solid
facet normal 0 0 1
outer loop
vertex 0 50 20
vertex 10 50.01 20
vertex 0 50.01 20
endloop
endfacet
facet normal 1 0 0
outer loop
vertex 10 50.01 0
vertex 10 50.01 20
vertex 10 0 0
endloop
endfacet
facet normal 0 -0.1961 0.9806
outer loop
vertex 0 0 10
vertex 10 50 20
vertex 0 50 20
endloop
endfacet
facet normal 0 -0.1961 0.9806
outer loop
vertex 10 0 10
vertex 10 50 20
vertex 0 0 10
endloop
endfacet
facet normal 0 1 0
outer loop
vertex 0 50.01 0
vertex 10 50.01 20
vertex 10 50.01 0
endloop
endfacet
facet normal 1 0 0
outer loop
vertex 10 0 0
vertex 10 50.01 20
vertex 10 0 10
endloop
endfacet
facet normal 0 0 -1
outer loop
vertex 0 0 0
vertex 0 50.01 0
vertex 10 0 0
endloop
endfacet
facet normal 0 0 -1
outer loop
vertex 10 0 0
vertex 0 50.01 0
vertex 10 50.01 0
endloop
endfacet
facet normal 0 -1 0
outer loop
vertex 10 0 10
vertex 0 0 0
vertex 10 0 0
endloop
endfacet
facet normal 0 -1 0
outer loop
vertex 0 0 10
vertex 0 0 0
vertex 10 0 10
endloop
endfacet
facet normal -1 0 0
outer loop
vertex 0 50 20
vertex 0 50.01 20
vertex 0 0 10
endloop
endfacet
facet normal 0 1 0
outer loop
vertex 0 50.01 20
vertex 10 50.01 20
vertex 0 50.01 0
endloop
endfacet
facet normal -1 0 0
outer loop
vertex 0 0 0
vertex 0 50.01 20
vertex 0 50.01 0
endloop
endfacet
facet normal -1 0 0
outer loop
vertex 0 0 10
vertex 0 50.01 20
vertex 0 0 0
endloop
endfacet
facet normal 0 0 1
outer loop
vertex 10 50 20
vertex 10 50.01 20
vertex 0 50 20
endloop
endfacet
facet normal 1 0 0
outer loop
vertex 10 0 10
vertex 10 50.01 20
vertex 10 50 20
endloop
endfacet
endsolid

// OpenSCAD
// file: beams.scad
/* 
 * openscad beams library
 * create complex openscads objects from frames which are defining beams
 * (constructed like a ship body or airplane hull)
 *
 * https://github.com/Stemer114/openscad_beams
 * http://www.thingiverse.com/Stemer114/designs
 * 
 *    Copyright (C) 2016 Stemer114 (stemer114@merunka.de)
 *
 *    This program is free software: you can redistribute it and/or modify
 *    it under the terms of the GNU General Public License as published by
 *    the Free Software Foundation, either version 3 of the License, or
 *    (at your option) any later version.
 *
 *    This program is distributed in the hope that it will be useful,
 *    but WITHOUT ANY WARRANTY; without even the implied warranty of
 *    MERCHANTABILITY or FITNESS FOR A PARTICULAR PURPOSE.  See the
 *    GNU General Public License for more details.
 *
 *    You should have received a copy of the GNU General Public License
 *    along with this program.  If not, see <http://www.gnu.org/licenses/>.
 *

 * Credits: 
 *          for some of the examples
 *          MCAD Library - Polyholes Copyright 2011 Nophead (of RepRap fame)
 *          It is licensed under the terms of Creative Commons Attribution 3.0 Unported.
 *          https://github.com/SolidCode/MCAD/blob/master/polyholes.scad
 *
 *          BeamsVersion, libEcho and code structure inspired by 
 *          OpenSCAD Parts Library by randyy is licensed under the GNU - LGPL license. 
 *          http://www.thingiverse.com/thing:6021
 *
 */

//**** house keeping
//we define these as functions to avoid assignment problems from caller modules
function BeamsVersion() = 1.0;  //library version
function ep()=0.01;  //epsilon environment to avoid non-manifold objects


//**** module definitions

// a single rectangular frame, usually very thin
// params: w - width of frame (x direction)
//         h - height of frame (z direction)
//         d - thickness of frame (y direction, usually very thin, e.g. 0.1mm)
//         o - offset vector from origin (probably best to use x and y offsets only here for starters)
//         r - rotation vector (probably best to use only z rotation here for starters)
//         vec - vector interface, used instead of the named params
//         the vector must use the following structure (example)
//           w  h  rotation    offset        thickness
//          [3, 4, [0, 0, 90], [0, -1.5, 0], ep ],   //start (front center)
//         there is no checking other than length checking to branch in the interface
//         so better make sure the vector conforms
//         the vector interface allows you to define a list of vectors in your source file
//         and supply them all at once to the beam module (see below)
//         this probably makes more sense if you look at some of the example files
module frame(
        w = 10,  //width
        h = 10,  //height
        r = [0, 0, 0],  //rotation vector
        o = [0, 0, 0],   //offset vector
        d = ep(),  //thickness (normally very thin)
        vec = [],  //vector, default none
        )
{
    if ( len(vec)==5 ) {
        //use vector interface
        translate( vec[3] )
            rotate( vec[2] )
            cube([ vec[0], vec[4], vec[1] ]);
    } else {
        //use single param interface
        translate(o)
            rotate(r)
            cube([w, d, h]);
    }  //end else
}  //end module

// a single beam consisting of two frames at either end, connected by a hull
// to disable hull, use no_hull=true (for debugging)
// beam uses the vector interface (see above in module frame)
module beam(
        frame1 = [10, 10, [0, 0, 0], [0, 0, 0], ep() ],
        frame2 = [10, 10, [0, 0, 0], [0, 20, 0], ep() ],
        no_hull = false,   
        )
{
    if ( no_hull ) {
        frame(vec=frame1);
        frame(vec=frame2);
    } else {
        hull() {
            frame(vec=frame1);
            frame(vec=frame2);
        }  //end hull
    }  //end else
}  //end module

// a beam consisting of 2 or more frames connected by hulls
// uses the vector interface (see above)
// see example scad files in library source to get an idea how to use this
module beam_multi(frames=[], no_hull=false )
{
    if ( len(frames)<2 ) {
        echo("WARNING: beam_multi: number of frames too small (must be at least 2): ", len(frames) );
    } else {
        for ( frame = [0:len(frames)-2] ) {
            beam( frames[frame], frames[frame+1], no_hull=no_hull );
        } //end for

    }
}

/*************************************************
 * interface 
*/

libEcho=true;
if (libEcho!=false){ 
	echo("****************************************************************  ");
    echo(" beams scad library loaded.");
    echo(" Version: ", BeamsVersion() );
    echo(" usage: - include beams.scad in your project dir,");
    echo("        - then add include <beams.scad> to your script ");
	echo("        - to turn off this header, place libEcho=false; in your script");
    echo("        - see examples scad files to some inspiration")
	echo("****************************************************************  ");
}
// main file
/*
 * example for using openscad beams library
 * see https://github.com/Stemer114/openscad_beams
 *
 */

ep = 0.01;  //epsilon environment

include <beams.scad>

//          w   h   rotation   offset    thickness
params = [ 
           [10, 10, [0, 0, 0], [0, 0, 0], ep ],  //first frame
           [10, 20, [0, 0, 0], [0, 50, 0], ep ]  //second frame
         ];

beam_multi(frames=params );
